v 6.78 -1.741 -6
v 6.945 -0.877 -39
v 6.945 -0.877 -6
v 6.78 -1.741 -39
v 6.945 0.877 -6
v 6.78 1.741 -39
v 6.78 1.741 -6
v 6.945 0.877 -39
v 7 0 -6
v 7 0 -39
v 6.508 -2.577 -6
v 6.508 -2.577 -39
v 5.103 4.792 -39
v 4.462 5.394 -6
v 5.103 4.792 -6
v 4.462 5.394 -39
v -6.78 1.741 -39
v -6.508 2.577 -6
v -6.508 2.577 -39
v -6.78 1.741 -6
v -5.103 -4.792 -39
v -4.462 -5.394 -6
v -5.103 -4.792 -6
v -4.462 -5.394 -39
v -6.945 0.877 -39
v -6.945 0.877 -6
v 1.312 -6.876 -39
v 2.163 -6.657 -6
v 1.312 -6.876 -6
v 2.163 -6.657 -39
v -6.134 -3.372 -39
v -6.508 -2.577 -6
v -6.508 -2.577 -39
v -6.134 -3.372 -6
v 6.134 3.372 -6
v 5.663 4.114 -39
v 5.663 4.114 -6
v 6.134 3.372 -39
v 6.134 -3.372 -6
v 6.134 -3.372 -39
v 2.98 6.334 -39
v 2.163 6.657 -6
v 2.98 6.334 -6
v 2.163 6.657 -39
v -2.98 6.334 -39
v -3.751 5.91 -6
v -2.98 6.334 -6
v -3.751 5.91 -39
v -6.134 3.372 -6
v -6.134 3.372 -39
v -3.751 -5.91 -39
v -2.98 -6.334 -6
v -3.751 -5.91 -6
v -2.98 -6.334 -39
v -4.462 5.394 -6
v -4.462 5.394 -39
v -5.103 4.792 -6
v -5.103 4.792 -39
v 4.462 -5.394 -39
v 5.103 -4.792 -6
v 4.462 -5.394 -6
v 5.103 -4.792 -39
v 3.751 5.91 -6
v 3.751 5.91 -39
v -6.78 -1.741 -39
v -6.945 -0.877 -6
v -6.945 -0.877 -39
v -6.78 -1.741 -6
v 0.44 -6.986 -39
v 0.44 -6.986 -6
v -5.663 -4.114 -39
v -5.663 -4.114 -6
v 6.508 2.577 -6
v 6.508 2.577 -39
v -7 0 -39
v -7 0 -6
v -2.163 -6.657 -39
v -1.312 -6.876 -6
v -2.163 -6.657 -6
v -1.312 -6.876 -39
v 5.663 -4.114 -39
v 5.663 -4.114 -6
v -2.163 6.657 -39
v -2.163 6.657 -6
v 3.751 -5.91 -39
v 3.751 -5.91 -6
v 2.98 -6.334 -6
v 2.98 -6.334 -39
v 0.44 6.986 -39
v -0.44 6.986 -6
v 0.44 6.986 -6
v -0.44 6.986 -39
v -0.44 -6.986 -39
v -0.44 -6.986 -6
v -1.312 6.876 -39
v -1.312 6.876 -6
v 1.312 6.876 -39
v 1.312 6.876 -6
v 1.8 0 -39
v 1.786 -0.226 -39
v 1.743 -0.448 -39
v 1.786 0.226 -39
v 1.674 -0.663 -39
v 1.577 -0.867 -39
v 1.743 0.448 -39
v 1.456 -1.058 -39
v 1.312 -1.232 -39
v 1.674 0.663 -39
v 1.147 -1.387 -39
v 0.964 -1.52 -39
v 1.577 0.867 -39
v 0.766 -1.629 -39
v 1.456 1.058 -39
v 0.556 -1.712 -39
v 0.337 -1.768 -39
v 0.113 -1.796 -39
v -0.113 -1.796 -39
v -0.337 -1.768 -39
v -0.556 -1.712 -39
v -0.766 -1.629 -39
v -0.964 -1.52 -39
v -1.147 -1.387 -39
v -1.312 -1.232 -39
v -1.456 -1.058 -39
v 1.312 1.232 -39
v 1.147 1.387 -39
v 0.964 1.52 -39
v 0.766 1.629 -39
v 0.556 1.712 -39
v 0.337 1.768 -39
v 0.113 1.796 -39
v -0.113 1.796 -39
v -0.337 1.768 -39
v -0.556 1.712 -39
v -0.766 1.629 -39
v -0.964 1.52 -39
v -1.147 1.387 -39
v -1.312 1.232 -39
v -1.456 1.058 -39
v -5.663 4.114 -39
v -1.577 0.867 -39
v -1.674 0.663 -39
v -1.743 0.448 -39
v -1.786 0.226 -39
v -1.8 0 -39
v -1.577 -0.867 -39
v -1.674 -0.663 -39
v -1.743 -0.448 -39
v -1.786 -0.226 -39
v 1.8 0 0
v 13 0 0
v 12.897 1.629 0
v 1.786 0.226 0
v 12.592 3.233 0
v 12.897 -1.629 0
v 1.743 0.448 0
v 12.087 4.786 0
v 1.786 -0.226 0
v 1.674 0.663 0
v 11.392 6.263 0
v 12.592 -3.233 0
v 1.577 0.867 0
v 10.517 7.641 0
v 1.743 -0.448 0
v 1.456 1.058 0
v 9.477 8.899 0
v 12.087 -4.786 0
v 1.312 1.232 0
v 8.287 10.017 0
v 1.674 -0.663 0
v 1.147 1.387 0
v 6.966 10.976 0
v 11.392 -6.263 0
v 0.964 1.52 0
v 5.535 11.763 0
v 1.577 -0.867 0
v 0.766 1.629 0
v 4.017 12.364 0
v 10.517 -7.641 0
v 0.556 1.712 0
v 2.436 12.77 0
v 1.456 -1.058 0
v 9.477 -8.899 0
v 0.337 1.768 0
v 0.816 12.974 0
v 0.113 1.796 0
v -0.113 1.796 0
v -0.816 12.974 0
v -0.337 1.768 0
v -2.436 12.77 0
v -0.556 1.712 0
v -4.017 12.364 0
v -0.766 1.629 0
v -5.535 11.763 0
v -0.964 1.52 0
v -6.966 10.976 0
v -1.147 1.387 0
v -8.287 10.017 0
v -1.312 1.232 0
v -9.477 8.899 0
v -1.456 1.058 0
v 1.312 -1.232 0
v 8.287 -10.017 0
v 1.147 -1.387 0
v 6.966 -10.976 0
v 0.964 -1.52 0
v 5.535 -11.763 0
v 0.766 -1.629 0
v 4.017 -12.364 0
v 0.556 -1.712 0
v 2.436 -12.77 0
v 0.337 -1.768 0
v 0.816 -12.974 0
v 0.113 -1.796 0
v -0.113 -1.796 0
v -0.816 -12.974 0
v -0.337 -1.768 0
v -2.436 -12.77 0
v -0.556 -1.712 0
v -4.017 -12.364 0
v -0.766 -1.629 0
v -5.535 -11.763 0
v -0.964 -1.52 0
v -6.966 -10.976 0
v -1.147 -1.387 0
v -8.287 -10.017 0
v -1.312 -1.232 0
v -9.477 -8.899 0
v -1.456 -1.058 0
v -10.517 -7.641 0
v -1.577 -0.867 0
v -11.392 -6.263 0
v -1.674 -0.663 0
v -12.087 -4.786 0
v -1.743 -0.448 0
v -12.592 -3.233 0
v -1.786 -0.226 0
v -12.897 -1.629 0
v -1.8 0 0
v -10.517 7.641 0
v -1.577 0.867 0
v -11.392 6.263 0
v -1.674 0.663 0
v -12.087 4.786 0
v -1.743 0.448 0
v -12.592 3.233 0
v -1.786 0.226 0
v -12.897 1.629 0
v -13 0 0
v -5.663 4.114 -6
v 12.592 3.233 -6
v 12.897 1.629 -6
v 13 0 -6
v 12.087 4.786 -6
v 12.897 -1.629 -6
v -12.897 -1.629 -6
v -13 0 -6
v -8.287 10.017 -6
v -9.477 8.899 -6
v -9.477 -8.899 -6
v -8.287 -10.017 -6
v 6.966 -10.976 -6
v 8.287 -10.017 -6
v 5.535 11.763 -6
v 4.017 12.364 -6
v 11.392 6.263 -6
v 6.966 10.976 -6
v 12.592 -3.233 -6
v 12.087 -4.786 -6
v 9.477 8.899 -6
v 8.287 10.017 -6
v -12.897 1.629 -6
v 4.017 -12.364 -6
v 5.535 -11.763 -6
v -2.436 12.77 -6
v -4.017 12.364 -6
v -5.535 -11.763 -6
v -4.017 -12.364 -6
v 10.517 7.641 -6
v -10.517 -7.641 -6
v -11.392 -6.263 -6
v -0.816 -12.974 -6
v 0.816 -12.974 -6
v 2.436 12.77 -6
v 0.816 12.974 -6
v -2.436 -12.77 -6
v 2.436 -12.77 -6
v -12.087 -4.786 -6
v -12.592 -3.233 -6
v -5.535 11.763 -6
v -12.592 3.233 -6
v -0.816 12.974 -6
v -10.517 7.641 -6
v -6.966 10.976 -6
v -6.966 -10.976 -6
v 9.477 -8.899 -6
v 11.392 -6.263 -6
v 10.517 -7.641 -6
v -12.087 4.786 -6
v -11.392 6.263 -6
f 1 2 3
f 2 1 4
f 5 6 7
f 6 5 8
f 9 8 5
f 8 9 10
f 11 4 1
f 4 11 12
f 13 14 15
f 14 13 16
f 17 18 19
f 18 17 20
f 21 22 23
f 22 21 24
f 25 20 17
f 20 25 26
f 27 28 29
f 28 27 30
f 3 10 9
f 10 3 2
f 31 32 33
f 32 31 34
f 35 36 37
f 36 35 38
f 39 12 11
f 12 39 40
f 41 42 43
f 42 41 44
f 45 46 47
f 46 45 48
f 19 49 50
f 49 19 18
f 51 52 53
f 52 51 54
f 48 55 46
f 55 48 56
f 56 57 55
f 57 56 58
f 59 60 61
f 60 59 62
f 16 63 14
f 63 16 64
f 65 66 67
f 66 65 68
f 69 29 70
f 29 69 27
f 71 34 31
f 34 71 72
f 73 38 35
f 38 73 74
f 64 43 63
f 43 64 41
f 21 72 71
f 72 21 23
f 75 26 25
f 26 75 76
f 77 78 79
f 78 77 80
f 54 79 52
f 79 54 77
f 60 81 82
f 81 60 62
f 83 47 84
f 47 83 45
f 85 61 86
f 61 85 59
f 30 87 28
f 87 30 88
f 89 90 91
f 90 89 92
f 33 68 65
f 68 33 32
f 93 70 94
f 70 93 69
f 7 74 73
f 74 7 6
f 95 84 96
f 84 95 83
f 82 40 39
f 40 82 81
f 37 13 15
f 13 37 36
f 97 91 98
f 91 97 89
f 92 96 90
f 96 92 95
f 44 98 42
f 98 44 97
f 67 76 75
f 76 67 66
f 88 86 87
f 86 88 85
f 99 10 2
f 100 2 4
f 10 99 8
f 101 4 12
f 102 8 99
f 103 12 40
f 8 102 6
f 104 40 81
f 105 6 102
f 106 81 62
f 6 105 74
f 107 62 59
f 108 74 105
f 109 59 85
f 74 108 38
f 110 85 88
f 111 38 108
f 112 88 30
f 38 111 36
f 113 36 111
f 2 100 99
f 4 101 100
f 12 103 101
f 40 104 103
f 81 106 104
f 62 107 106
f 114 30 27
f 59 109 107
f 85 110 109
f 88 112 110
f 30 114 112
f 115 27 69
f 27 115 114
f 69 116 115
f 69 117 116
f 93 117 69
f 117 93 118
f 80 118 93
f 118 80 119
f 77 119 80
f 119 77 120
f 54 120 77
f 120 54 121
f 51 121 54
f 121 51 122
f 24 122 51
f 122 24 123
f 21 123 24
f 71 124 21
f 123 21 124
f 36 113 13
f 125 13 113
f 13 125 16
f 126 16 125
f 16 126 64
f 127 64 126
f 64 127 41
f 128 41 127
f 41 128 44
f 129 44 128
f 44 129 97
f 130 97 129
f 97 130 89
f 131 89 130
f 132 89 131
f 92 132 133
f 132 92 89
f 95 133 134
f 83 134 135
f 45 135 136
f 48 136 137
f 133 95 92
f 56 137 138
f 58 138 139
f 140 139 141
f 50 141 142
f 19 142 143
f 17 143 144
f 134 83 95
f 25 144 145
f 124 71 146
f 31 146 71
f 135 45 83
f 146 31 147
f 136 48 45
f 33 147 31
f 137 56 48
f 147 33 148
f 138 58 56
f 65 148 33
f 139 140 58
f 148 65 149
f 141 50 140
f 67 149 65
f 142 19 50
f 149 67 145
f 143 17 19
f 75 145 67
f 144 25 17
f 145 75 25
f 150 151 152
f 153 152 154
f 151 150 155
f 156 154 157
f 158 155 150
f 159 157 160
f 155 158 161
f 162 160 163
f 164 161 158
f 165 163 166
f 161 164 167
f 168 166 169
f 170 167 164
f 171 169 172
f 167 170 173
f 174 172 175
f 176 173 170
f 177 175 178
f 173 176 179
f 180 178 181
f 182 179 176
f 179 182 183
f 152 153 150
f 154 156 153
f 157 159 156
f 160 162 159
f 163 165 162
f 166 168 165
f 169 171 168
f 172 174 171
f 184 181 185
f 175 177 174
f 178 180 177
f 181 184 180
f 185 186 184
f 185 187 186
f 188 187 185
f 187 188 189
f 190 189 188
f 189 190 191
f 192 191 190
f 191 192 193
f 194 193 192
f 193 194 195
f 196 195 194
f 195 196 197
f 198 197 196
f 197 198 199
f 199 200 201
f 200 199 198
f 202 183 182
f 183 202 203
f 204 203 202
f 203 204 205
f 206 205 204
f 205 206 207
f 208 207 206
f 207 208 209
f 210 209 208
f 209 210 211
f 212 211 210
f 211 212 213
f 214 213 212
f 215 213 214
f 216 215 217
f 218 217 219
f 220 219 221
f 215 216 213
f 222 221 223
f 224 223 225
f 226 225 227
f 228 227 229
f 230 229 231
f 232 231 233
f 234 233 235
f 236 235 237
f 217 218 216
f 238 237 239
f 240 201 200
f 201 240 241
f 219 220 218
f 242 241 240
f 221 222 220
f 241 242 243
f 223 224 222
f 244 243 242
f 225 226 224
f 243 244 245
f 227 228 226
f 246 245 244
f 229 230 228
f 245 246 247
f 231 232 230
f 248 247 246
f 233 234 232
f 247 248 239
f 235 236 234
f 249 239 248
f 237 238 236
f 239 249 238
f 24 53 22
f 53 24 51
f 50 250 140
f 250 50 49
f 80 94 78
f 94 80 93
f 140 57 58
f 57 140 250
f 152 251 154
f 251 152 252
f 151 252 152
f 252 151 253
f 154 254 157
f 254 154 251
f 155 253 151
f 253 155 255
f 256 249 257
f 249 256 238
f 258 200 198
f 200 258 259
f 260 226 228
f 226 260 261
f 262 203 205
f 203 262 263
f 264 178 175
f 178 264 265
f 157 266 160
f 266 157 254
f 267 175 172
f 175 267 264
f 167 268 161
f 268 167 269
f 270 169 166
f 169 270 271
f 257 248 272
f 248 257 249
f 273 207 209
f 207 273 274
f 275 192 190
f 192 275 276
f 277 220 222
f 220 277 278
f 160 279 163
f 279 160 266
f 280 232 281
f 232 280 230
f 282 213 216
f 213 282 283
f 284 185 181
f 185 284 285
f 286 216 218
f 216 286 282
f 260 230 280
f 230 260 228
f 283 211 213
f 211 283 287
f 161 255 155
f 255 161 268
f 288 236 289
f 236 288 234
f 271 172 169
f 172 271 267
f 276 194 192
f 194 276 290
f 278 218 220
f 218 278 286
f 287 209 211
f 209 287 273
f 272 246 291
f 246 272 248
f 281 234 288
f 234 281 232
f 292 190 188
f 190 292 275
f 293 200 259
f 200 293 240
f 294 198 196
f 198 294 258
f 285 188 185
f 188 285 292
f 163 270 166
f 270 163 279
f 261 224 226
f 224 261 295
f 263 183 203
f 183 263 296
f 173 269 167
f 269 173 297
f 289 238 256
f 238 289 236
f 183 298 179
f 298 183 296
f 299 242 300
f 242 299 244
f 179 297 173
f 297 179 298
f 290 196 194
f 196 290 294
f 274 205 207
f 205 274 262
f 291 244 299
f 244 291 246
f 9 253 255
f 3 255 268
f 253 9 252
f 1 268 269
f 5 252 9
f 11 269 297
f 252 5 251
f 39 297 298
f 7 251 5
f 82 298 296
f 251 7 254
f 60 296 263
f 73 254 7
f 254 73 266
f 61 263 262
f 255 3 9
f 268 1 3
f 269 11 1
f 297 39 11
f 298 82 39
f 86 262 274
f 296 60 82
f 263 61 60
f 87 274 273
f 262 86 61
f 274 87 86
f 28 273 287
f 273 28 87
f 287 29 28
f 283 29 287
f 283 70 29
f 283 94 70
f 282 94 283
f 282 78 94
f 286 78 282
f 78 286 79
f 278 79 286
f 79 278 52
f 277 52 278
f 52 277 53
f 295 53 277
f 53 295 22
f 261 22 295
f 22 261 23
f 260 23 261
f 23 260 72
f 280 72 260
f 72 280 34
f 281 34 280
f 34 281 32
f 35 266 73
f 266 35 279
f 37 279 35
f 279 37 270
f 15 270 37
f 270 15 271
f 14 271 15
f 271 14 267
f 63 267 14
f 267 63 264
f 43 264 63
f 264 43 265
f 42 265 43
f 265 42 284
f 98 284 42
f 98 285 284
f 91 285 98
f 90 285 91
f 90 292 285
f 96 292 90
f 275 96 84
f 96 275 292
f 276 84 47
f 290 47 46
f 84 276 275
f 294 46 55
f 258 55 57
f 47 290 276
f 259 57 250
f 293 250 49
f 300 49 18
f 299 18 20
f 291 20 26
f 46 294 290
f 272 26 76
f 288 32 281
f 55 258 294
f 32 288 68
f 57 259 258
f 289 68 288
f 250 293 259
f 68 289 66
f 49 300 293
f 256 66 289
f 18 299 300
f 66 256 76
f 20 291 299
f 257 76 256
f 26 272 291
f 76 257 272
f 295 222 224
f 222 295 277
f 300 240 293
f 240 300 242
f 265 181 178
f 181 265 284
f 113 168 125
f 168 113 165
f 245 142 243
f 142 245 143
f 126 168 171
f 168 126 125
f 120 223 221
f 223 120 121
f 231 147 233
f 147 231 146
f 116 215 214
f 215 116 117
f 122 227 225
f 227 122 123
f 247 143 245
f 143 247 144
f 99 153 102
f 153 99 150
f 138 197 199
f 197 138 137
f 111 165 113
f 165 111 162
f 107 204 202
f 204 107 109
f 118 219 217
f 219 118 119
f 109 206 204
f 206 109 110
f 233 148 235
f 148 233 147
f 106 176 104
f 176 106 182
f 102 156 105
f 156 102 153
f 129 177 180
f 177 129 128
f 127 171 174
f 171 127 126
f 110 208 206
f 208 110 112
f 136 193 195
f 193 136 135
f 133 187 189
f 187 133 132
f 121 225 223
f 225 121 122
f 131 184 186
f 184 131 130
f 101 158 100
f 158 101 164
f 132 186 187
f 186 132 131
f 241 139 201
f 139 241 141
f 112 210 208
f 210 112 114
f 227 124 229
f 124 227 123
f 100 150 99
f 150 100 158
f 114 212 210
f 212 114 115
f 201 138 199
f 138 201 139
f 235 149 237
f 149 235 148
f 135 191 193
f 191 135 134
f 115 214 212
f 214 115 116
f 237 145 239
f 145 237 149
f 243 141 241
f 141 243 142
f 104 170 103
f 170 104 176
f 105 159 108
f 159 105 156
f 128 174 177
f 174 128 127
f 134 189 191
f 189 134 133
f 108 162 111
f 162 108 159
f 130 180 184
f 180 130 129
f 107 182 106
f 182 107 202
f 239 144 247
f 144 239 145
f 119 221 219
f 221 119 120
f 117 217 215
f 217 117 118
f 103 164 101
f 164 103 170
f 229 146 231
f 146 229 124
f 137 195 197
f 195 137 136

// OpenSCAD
$fn = 50;


difference() {
	union() {
		translate(v = [0, 0, -39.0000000000]) {
			cylinder(h = 39, r = 7.0000000000);
		}
		translate(v = [0, 0, -6.0000000000]) {
			cylinder(h = 6, r = 13.0000000000);
		}
	}
	union() {
		#translate(v = [0, 0, -39]) {
			cylinder(h = 39, r = 1.8000000000);
		}
	}
}
